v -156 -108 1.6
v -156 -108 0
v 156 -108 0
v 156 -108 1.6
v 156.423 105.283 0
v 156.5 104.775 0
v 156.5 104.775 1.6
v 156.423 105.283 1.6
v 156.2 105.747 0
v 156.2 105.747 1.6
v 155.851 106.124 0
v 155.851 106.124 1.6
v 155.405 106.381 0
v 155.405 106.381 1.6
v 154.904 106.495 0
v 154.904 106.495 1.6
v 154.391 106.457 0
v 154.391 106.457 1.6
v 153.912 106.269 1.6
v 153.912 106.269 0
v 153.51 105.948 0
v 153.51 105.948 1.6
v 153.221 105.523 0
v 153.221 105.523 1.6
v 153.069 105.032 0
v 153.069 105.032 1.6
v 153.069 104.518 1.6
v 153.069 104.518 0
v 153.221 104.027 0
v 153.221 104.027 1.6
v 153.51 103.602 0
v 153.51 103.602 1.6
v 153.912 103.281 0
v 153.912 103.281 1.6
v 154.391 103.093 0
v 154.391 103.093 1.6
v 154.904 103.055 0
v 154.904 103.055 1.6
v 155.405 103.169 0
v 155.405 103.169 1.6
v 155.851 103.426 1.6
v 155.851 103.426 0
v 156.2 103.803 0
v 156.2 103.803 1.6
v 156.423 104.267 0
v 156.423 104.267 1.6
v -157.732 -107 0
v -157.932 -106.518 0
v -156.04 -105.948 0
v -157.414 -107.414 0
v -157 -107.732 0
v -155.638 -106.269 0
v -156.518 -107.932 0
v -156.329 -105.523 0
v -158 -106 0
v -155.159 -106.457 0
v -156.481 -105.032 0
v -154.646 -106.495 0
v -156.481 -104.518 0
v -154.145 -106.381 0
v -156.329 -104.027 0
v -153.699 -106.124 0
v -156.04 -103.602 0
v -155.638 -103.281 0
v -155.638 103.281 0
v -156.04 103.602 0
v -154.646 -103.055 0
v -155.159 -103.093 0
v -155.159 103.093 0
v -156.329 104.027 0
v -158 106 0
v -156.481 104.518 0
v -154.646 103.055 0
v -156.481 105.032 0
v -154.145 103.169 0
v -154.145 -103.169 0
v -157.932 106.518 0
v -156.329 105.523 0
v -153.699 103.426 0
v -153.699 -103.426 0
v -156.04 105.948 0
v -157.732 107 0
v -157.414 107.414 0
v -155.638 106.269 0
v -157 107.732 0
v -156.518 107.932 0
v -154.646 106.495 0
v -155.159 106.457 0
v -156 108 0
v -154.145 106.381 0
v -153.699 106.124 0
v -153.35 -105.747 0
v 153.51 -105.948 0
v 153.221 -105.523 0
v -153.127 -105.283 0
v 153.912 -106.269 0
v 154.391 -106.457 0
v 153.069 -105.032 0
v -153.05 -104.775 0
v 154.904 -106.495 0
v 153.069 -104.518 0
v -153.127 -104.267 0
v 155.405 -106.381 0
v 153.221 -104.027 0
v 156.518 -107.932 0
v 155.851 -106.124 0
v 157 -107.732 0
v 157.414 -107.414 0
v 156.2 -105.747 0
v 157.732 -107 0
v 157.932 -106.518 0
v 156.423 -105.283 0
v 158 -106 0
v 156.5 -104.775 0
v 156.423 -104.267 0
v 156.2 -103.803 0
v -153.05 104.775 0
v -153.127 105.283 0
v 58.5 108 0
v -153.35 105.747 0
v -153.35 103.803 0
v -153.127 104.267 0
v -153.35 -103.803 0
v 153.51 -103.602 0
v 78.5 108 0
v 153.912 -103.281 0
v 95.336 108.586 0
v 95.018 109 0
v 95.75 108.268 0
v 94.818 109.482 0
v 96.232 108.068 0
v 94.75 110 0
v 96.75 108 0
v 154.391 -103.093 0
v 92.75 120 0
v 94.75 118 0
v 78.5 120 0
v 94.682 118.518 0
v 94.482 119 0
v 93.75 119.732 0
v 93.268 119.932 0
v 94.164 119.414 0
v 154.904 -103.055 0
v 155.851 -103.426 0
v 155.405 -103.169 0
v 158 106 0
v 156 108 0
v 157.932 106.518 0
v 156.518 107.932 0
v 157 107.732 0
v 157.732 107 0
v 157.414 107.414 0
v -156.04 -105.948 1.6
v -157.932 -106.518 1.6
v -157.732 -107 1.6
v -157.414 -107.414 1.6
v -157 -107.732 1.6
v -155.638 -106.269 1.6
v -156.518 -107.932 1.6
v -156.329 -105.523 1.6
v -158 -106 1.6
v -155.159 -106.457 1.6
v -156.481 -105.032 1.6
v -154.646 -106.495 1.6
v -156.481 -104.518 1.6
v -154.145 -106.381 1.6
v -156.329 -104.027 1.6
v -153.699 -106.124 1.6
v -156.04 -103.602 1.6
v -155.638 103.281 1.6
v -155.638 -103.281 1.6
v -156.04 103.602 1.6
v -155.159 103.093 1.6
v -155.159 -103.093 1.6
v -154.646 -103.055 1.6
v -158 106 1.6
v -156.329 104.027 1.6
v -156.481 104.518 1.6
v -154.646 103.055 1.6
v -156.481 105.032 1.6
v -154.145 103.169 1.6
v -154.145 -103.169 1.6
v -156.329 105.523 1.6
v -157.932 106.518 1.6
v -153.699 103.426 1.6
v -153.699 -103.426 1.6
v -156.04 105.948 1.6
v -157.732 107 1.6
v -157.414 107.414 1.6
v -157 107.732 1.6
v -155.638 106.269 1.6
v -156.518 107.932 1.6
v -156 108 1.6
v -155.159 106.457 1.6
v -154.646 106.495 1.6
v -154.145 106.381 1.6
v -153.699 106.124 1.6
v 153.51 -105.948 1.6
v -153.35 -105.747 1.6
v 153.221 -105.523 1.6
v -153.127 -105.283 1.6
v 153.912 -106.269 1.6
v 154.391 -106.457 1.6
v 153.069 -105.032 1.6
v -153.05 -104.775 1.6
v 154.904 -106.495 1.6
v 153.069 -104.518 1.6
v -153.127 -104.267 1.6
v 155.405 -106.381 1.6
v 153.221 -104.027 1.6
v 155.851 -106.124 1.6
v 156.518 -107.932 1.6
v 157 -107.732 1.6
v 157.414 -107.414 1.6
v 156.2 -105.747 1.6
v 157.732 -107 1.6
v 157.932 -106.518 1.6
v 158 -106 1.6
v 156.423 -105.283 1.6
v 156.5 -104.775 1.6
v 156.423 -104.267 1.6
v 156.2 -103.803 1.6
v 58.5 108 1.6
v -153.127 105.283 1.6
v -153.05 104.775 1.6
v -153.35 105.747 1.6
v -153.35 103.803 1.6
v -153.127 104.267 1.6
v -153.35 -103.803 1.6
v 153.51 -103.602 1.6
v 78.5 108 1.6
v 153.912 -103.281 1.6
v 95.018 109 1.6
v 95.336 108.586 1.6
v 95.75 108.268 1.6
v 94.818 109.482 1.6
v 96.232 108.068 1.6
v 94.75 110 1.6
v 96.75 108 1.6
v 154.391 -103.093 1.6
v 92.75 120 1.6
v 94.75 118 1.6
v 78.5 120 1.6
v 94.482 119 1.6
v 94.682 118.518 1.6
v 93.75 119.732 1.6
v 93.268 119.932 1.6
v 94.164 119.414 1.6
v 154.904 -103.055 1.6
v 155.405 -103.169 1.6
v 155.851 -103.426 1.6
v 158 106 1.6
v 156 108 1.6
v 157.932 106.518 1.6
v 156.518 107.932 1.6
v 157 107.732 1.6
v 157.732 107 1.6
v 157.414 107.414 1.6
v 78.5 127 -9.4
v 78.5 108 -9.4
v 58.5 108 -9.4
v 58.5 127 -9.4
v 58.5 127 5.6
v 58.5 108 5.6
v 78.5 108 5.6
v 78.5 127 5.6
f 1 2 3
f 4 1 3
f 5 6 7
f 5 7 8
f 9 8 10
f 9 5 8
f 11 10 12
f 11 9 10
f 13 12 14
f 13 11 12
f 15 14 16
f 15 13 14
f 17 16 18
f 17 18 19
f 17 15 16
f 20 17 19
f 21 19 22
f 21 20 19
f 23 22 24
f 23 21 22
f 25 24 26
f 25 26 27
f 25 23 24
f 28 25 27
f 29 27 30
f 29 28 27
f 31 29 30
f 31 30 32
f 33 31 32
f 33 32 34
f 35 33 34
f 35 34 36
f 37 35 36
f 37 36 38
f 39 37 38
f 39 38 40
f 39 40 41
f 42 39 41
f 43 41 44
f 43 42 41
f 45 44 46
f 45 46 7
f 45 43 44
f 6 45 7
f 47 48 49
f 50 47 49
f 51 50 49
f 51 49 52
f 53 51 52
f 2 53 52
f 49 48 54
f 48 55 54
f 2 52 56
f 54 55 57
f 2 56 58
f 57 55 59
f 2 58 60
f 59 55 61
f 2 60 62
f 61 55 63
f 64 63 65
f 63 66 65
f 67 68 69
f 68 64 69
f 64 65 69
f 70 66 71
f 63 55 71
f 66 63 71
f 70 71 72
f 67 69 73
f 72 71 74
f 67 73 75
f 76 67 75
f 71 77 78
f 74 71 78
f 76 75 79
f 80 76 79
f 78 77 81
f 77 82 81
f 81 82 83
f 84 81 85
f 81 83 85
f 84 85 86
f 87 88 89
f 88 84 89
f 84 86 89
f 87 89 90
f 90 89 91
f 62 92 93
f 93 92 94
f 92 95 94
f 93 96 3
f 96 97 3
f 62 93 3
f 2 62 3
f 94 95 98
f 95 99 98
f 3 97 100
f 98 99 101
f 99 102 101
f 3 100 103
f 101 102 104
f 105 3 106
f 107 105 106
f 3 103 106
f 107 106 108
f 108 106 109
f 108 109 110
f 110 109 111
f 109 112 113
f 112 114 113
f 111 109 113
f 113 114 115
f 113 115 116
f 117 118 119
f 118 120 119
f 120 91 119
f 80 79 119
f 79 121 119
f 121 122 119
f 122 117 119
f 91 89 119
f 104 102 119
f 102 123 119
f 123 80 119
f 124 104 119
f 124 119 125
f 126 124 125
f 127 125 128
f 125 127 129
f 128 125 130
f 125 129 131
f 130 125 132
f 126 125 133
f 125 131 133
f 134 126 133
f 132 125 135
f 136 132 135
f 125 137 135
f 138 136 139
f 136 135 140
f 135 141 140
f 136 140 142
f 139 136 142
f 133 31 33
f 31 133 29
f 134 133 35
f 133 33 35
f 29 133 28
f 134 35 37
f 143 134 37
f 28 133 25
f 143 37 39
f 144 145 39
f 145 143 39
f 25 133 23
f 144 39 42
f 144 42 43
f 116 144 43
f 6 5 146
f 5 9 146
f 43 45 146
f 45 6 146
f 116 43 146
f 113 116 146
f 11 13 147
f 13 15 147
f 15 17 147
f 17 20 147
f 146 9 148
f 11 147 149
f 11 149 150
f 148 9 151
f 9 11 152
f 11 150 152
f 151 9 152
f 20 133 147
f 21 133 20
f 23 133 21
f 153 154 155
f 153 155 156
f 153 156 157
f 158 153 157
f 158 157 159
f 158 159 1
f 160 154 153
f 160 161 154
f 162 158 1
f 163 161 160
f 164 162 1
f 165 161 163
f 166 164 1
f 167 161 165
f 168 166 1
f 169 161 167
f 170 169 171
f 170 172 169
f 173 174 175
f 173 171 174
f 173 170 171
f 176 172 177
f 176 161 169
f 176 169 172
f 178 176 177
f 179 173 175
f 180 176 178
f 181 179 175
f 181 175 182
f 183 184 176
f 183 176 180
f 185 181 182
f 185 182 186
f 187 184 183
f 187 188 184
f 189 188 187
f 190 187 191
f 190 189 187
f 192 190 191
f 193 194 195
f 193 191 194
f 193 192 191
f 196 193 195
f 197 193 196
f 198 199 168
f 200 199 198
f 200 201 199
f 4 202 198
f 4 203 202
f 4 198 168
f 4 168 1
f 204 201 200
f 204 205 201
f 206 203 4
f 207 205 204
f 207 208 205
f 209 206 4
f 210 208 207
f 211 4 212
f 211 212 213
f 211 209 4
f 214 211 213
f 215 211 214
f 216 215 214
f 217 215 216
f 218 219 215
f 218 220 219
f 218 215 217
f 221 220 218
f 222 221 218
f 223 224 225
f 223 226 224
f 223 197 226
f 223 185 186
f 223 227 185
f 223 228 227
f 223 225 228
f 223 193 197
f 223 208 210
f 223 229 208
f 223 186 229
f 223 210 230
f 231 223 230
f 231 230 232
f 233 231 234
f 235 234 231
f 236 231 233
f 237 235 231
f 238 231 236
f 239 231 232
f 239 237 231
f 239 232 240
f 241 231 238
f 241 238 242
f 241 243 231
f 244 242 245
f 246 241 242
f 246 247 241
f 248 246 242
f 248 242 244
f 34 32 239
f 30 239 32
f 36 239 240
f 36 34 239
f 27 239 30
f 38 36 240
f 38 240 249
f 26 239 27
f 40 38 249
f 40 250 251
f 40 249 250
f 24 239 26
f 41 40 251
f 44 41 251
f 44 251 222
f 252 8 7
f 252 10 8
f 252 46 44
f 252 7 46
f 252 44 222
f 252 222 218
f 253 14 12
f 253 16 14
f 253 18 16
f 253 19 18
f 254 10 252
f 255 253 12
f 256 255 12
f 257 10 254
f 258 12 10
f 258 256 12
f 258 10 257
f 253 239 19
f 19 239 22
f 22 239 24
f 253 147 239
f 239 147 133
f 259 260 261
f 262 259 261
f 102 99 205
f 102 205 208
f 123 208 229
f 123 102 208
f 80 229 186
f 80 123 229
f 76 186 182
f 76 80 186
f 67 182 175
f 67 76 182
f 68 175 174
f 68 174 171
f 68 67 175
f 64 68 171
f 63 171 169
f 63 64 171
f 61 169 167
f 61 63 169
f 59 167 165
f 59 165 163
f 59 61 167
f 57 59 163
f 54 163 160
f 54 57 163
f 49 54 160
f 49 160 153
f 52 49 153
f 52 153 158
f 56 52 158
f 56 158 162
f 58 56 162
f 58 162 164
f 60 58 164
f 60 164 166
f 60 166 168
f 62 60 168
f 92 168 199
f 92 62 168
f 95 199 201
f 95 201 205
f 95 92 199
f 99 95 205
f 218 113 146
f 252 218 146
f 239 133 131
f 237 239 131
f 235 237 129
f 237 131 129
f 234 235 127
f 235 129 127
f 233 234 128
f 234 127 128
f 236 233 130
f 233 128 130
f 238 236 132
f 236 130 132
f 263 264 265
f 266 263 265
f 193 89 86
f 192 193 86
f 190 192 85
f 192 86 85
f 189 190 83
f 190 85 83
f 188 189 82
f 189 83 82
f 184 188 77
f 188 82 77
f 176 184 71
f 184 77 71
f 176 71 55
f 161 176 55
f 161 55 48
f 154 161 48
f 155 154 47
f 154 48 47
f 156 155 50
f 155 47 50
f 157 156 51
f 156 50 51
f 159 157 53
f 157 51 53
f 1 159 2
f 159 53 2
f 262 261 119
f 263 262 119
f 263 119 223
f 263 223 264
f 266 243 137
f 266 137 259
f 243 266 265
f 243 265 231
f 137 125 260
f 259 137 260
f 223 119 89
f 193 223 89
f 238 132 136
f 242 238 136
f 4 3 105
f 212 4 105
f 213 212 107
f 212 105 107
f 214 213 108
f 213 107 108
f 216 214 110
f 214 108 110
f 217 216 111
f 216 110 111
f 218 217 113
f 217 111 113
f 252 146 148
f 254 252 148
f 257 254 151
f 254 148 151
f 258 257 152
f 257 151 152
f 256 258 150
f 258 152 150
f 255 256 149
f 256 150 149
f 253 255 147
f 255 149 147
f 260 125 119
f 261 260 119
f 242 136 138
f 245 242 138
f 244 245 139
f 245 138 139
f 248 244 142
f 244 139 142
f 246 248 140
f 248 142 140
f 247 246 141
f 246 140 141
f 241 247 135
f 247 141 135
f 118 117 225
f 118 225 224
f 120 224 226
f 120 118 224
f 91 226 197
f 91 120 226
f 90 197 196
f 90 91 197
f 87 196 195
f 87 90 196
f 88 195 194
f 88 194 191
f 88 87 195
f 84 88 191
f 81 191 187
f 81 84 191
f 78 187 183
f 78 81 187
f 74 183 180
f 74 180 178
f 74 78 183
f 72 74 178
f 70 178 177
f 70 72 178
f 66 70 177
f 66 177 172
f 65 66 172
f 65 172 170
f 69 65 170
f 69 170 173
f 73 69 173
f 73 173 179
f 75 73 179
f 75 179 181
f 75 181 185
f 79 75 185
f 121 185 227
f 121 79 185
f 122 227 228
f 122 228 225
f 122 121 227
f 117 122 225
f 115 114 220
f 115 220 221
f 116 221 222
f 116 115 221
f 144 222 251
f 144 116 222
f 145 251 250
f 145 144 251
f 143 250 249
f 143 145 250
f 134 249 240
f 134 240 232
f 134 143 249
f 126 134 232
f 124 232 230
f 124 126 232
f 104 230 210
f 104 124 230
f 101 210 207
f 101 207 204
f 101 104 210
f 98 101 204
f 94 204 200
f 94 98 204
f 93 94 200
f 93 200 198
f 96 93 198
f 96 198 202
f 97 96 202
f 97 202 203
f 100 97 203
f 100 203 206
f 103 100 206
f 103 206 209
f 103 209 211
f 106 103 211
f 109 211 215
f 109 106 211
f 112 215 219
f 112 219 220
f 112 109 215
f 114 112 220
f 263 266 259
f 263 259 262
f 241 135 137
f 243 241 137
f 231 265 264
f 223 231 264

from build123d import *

# Parameters (mm, degrees)
F0_R     = 1.725
F1_DEPTH = 1.6
F3_DEPTH = 19


with BuildPart() as f1:
    # F0 (on Top) → F1 (new body)
    with BuildSketch(Plane.XY):
        with BuildLine():
            ThreePointArc((158, 106), (157.414214, 107.414214), (156, 108))
            Line((156, 108), (96.75, 108))
            ThreePointArc((96.75, 108), (95.335786, 108.585786), (94.75, 110))
            Line((94.75, 110), (94.75, 118))
            ThreePointArc((94.75, 118), (94.164214, 119.414214), (92.75, 120))
            Line((92.75, 120), (58.5, 120))
            Line((58.5, 120), (58.5, 108))
            Line((58.5, 108), (-156, 108))
            ThreePointArc((-156, 108), (-157.414214, 107.414214), (-158, 106))
            Line((-158, 106), (-158, -106))
            ThreePointArc((-158, -106), (-157.414214, -107.414214), (-156, -108))
            Line((-156, -108), (156, -108))
            ThreePointArc((156, -108), (157.414214, -107.414214), (158, -106))
            Line((158, -106), (158, 106))
        make_face()
        with Locations((-154.775, -104.775)):
            Circle(F0_R, mode=Mode.SUBTRACT)
        with Locations((154.775, -104.775)):
            Circle(F0_R, mode=Mode.SUBTRACT)
        with Locations((-154.775, 104.775)):
            Circle(F0_R, mode=Mode.SUBTRACT)
        with Locations((154.775, 104.775)):
            Circle(F0_R, mode=Mode.SUBTRACT)
    extrude(amount=F1_DEPTH)

    # F2 (on face) → F3 (join)
    with BuildSketch(Plane(origin=(0, 108, 0), x_dir=(-1, 0, 0), z_dir=(0, 1, 0))):
        Polygon((-58.5, 1.6), (-58.5, 5.6), (-78.5, 5.6), (-78.5, -9.4), (-58.5, -9.4), (-58.5, 0), align=None)
    extrude(amount=F3_DEPTH)


solid = f1.part
